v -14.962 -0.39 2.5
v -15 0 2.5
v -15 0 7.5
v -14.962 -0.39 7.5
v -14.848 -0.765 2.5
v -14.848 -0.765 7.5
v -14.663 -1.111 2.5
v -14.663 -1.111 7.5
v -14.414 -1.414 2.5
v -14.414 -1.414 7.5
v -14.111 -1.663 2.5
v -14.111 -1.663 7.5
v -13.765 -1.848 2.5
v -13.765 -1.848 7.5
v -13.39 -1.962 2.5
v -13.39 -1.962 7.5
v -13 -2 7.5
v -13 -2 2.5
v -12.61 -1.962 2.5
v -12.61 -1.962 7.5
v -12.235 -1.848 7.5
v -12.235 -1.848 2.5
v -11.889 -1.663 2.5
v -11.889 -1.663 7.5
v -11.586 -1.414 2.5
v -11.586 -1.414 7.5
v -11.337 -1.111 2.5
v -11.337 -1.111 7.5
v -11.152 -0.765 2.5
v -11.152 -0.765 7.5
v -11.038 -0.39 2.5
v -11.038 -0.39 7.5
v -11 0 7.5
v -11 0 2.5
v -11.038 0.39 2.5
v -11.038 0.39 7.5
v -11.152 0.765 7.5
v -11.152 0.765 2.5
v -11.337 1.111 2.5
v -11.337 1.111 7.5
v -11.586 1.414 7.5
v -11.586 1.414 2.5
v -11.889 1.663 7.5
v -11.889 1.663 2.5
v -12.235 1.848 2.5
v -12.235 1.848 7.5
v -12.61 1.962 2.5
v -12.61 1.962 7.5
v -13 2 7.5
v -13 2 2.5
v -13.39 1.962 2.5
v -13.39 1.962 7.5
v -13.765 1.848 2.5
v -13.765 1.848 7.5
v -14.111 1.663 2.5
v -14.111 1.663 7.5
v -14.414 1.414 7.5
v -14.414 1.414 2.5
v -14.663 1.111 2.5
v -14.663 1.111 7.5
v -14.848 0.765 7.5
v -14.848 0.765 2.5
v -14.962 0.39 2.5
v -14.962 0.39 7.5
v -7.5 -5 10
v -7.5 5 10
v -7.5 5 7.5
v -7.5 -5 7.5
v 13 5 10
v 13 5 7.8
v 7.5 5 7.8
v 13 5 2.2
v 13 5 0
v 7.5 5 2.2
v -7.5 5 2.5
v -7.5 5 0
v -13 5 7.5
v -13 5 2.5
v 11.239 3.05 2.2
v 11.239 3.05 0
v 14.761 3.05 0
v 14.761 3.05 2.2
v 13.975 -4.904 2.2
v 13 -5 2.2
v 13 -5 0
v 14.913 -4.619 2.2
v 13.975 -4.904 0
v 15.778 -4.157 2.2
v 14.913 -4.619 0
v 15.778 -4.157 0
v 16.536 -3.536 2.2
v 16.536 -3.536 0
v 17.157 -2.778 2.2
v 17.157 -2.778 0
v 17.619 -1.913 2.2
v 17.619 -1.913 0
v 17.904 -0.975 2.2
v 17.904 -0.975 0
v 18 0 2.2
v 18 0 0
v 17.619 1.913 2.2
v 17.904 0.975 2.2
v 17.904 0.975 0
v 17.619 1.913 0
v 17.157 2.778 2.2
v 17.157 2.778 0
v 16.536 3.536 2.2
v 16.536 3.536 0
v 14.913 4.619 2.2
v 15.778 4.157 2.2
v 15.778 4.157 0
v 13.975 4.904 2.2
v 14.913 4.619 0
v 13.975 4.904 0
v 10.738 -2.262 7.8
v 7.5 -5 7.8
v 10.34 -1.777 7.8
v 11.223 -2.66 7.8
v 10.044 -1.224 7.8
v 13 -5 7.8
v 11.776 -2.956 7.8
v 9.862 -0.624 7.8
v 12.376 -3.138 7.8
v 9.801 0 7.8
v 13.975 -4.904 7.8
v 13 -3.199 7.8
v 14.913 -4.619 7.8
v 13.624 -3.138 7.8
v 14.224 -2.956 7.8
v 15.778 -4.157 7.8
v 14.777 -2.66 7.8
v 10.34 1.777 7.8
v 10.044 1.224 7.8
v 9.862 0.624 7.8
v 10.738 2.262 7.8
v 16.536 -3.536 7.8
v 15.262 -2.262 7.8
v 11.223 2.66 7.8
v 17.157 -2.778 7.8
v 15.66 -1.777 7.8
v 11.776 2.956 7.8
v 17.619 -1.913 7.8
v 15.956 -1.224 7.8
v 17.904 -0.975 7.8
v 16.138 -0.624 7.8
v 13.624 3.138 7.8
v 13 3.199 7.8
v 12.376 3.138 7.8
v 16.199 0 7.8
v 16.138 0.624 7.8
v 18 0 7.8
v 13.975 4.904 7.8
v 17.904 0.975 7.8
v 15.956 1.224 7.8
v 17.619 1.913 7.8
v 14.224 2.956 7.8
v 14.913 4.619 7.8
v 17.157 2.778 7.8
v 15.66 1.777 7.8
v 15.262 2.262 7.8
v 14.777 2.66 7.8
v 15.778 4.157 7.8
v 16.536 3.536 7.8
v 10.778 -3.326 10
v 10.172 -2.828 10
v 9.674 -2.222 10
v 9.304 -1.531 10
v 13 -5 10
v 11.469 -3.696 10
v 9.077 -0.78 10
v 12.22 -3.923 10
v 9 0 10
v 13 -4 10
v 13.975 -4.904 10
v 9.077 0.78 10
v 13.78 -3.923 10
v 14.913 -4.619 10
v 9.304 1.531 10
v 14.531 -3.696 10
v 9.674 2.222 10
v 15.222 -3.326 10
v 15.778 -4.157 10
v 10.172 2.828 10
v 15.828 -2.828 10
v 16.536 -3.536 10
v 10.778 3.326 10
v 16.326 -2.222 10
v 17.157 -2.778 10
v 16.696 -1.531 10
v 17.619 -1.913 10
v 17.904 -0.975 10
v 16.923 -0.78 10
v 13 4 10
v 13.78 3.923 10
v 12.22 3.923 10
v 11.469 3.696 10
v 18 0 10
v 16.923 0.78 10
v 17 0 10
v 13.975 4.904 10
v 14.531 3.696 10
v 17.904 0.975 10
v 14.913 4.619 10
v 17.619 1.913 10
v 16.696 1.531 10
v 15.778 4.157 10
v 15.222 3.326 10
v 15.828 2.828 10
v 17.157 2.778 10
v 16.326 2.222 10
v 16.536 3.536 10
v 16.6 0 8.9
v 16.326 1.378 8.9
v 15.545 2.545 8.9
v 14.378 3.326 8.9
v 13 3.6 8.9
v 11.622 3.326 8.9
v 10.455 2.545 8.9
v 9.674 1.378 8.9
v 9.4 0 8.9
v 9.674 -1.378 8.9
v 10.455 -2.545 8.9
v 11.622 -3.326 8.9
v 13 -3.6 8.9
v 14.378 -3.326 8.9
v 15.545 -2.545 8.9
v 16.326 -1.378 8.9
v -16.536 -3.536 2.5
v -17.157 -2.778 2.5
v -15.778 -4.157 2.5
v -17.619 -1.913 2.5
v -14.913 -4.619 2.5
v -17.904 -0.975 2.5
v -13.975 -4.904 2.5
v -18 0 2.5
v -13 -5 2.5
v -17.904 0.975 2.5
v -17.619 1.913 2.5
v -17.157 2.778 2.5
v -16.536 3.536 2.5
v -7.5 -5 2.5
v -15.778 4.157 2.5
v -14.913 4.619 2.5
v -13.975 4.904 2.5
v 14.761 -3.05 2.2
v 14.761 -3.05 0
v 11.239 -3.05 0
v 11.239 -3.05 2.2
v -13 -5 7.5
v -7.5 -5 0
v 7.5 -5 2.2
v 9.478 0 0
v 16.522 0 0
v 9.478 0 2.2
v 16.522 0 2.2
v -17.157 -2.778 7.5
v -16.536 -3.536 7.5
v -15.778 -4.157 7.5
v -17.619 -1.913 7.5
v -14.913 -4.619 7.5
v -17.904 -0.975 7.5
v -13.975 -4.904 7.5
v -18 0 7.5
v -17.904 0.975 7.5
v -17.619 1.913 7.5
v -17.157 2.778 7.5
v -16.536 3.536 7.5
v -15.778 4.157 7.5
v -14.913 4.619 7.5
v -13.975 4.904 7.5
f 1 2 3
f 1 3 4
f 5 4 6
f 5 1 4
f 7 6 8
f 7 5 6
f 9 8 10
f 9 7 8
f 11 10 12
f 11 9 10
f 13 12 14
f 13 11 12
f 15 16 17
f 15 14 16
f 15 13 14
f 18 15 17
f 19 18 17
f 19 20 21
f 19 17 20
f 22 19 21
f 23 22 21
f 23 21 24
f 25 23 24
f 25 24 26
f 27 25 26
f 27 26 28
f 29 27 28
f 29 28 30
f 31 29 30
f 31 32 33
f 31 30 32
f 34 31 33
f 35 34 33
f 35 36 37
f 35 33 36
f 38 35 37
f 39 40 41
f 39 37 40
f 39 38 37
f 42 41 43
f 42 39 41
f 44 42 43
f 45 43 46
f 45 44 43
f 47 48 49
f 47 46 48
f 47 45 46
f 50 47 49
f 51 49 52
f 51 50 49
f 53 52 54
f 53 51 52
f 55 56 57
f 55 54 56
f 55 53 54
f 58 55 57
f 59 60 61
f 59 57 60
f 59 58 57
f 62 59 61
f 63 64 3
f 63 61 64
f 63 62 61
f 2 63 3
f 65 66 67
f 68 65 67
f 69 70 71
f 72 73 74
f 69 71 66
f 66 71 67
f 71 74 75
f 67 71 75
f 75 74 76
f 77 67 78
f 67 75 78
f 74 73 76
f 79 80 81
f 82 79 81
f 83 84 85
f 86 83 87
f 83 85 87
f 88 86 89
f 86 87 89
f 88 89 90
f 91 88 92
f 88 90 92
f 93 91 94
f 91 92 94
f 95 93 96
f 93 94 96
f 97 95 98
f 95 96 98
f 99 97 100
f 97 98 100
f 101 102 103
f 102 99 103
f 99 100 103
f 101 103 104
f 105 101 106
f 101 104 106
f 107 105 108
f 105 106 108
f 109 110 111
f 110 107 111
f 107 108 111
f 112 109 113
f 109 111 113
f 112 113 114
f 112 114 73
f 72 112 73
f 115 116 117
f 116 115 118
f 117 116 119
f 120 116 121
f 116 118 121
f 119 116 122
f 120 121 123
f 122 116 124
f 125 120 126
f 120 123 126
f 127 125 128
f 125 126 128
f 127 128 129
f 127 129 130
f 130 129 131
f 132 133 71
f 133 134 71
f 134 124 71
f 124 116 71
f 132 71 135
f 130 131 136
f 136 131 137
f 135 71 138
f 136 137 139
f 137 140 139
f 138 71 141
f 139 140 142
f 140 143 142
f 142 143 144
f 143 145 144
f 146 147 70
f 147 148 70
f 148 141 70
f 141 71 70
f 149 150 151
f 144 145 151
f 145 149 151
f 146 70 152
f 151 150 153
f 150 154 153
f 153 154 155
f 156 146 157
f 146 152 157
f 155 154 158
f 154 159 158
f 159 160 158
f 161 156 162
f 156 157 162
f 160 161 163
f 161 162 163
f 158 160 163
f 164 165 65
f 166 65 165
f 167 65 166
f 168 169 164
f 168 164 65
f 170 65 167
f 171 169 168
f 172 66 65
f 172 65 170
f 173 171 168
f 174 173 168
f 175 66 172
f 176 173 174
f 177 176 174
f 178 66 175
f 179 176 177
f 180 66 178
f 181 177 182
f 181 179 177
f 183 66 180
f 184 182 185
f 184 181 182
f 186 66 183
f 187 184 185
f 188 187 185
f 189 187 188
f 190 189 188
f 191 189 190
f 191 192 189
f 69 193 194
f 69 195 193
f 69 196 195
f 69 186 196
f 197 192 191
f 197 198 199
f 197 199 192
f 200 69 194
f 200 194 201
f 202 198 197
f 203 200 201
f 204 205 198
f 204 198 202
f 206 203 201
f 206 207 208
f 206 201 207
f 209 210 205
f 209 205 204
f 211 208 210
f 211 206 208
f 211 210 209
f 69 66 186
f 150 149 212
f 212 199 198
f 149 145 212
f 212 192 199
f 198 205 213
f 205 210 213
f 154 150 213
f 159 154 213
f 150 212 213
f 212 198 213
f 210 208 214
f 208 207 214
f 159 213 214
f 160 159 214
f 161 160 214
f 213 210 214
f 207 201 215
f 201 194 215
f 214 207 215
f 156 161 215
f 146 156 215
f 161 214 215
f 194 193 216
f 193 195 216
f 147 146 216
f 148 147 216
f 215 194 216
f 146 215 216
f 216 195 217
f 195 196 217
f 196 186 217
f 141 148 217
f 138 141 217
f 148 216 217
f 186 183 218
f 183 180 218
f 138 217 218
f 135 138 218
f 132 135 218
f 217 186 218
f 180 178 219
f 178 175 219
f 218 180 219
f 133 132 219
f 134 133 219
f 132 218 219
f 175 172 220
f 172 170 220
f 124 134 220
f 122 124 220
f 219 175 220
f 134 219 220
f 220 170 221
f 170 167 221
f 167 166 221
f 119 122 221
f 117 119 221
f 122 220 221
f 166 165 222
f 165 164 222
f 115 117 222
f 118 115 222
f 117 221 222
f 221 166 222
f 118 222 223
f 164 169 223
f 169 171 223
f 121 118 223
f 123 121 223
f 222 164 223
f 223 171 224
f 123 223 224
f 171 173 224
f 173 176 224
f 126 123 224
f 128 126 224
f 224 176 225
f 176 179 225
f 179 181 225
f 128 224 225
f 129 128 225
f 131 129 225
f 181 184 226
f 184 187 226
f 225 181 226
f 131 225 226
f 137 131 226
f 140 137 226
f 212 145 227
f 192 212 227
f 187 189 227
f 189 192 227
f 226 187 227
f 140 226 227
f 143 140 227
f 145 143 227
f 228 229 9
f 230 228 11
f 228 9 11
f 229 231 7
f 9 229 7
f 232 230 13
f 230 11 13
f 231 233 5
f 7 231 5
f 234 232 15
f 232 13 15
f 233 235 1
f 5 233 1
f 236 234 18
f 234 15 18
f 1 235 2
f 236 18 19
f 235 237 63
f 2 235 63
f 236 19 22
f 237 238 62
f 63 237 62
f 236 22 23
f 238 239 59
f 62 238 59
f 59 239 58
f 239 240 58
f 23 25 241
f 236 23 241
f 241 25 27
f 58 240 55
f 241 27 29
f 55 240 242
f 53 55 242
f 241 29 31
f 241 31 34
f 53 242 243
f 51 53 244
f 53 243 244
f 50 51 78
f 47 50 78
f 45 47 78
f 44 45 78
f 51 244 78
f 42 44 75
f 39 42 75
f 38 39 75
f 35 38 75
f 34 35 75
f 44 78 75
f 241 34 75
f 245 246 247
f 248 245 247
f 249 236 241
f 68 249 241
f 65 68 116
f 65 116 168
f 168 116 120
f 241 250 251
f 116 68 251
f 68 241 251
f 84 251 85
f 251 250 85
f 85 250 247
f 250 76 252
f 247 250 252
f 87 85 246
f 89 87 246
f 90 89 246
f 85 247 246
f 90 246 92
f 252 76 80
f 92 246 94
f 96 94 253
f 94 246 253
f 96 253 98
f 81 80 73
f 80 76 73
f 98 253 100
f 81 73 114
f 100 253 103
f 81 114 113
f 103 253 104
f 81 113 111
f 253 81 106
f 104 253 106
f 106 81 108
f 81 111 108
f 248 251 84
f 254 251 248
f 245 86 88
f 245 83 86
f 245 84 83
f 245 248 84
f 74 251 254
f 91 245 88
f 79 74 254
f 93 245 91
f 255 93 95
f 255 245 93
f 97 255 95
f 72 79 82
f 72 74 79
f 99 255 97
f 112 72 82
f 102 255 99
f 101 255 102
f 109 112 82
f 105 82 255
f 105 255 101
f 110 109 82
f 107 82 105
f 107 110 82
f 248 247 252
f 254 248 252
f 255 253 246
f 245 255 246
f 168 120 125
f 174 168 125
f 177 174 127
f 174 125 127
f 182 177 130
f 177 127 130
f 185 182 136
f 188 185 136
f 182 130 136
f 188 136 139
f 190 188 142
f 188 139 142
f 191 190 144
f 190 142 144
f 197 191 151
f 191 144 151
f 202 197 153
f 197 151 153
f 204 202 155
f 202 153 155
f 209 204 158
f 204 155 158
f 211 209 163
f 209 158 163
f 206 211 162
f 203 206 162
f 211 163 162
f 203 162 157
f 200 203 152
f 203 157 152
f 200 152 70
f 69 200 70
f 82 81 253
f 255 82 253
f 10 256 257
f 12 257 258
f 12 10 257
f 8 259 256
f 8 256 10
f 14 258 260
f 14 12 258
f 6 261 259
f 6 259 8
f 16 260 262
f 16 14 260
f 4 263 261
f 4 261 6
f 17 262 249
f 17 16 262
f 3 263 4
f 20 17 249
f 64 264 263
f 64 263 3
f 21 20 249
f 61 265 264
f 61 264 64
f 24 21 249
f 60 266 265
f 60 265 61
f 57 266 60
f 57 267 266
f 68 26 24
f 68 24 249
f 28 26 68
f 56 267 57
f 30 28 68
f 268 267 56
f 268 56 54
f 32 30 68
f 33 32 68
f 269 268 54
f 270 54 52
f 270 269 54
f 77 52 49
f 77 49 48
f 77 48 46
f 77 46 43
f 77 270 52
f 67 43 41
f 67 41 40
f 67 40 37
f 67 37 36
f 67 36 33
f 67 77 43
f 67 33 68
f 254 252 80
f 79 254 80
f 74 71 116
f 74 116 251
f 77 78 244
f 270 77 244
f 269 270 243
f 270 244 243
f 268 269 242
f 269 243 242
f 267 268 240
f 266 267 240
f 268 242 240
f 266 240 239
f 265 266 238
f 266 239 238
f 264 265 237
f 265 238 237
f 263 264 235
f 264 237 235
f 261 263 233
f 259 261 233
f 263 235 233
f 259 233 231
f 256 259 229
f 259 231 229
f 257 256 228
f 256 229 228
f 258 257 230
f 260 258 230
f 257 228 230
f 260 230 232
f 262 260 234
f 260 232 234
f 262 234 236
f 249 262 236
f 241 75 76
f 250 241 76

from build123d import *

# Parameters (mm, degrees)
EXTRUDE_1_DEPTH     = 10
SKETCH_3_W          = 10.5
SKETCH_3_H          = 5.6
CUT_EXTRUDE_2_DEPTH = 23.891046285
SKETCH_4_W          = 10.5
SKETCH_4_H          = 2.5
CUT_EXTRUDE_3_DEPTH = 23.891046285
SKETCH_2_R          = 4
CUT_EXTRUDE_4_DEPTH = 3
CUT_EXTRUDE_4_DRAFT = -20
CUT_EXTRUDE_5_DEPTH = 2.5
SKETCH_9_R          = 2
CUT_EXTRUDE_8_DEPTH = 9


with BuildPart() as part:
    # 草圖1 → 填料-伸長1 (new body)
    with BuildSketch(Plane.XY):
        with BuildLine():
            Line((-13, -5), (13, -5))
            ThreePointArc((13, -5), (18, 0), (13, 5))
            Line((13, 5), (-13, 5))
            ThreePointArc((-13, 5), (-18, 0), (-13, -5))
        make_face()
    extrude(amount=EXTRUDE_1_DEPTH)

    # 草圖3 → 除料-伸長2 (cut, through all)
    with BuildSketch(Plane(origin=(0, 5, 0), x_dir=(1, 0, 0), z_dir=(0, 1, 0))):
        with Locations((12.75, -5)):
            Rectangle(SKETCH_3_W, SKETCH_3_H)
    extrude(amount=-CUT_EXTRUDE_2_DEPTH, mode=Mode.SUBTRACT)

    # 草圖4 → 除料-伸長3 (cut, through all)
    with BuildSketch(Plane(origin=(0, 5, 0), x_dir=(1, 0, 0), z_dir=(0, 1, 0))):
        with Locations((-12.75, -1.25)):
            Rectangle(SKETCH_4_W, SKETCH_4_H)
        with Locations((-12.75, -8.75)):
            Rectangle(SKETCH_4_W, SKETCH_4_H)
    extrude(amount=-CUT_EXTRUDE_3_DEPTH, mode=Mode.SUBTRACT)


with BuildPart() as cut_extrude_4_tool:
    # 草圖2 → 除料-伸長4 (with draft: the straight prism first)
    with BuildSketch(Plane.XY.offset(10)):
        with Locations((13, 0)):
            Circle(SKETCH_2_R)
    extrude(amount=-CUT_EXTRUDE_4_DEPTH)
    # 除料-伸長4: the draft: its side faces are tilted about the plane it starts from
    cut_extrude_4_sides = [cut_extrude_4_tool.faces().sort_by_distance(p)[0] for p in [
        (9, 0, 8.5),
    ]]
    draft(cut_extrude_4_sides, Plane.XY.offset(10), CUT_EXTRUDE_4_DRAFT)


with BuildPart() as part_1:
    add(part.part)

    # 除料-伸長4: cut by cut_extrude_4_tool
    add(cut_extrude_4_tool.part, mode=Mode.SUBTRACT)

    # 草圖5 → 除料-伸長5 (cut)
    with BuildSketch(Plane(origin=(0, 0, 0), x_dir=(-1, 0, 0), z_dir=(0, 0, -1))):
        Polygon((-16.521836642, 0), (-14.760918321, -3.05), (-11.239081679, -3.05), (-9.478163358, 0), (-11.239081679, 3.05), (-14.760918321, 3.05), align=None)
    extrude(amount=-CUT_EXTRUDE_5_DEPTH, mode=Mode.SUBTRACT)

    # 草圖9 → 除料-伸長8 (cut)
    with BuildSketch(Plane.XY):
        with Locations((-13, 0)):
            Circle(SKETCH_9_R)
    extrude(amount=CUT_EXTRUDE_8_DEPTH, mode=Mode.SUBTRACT)


solid = part_1.part
